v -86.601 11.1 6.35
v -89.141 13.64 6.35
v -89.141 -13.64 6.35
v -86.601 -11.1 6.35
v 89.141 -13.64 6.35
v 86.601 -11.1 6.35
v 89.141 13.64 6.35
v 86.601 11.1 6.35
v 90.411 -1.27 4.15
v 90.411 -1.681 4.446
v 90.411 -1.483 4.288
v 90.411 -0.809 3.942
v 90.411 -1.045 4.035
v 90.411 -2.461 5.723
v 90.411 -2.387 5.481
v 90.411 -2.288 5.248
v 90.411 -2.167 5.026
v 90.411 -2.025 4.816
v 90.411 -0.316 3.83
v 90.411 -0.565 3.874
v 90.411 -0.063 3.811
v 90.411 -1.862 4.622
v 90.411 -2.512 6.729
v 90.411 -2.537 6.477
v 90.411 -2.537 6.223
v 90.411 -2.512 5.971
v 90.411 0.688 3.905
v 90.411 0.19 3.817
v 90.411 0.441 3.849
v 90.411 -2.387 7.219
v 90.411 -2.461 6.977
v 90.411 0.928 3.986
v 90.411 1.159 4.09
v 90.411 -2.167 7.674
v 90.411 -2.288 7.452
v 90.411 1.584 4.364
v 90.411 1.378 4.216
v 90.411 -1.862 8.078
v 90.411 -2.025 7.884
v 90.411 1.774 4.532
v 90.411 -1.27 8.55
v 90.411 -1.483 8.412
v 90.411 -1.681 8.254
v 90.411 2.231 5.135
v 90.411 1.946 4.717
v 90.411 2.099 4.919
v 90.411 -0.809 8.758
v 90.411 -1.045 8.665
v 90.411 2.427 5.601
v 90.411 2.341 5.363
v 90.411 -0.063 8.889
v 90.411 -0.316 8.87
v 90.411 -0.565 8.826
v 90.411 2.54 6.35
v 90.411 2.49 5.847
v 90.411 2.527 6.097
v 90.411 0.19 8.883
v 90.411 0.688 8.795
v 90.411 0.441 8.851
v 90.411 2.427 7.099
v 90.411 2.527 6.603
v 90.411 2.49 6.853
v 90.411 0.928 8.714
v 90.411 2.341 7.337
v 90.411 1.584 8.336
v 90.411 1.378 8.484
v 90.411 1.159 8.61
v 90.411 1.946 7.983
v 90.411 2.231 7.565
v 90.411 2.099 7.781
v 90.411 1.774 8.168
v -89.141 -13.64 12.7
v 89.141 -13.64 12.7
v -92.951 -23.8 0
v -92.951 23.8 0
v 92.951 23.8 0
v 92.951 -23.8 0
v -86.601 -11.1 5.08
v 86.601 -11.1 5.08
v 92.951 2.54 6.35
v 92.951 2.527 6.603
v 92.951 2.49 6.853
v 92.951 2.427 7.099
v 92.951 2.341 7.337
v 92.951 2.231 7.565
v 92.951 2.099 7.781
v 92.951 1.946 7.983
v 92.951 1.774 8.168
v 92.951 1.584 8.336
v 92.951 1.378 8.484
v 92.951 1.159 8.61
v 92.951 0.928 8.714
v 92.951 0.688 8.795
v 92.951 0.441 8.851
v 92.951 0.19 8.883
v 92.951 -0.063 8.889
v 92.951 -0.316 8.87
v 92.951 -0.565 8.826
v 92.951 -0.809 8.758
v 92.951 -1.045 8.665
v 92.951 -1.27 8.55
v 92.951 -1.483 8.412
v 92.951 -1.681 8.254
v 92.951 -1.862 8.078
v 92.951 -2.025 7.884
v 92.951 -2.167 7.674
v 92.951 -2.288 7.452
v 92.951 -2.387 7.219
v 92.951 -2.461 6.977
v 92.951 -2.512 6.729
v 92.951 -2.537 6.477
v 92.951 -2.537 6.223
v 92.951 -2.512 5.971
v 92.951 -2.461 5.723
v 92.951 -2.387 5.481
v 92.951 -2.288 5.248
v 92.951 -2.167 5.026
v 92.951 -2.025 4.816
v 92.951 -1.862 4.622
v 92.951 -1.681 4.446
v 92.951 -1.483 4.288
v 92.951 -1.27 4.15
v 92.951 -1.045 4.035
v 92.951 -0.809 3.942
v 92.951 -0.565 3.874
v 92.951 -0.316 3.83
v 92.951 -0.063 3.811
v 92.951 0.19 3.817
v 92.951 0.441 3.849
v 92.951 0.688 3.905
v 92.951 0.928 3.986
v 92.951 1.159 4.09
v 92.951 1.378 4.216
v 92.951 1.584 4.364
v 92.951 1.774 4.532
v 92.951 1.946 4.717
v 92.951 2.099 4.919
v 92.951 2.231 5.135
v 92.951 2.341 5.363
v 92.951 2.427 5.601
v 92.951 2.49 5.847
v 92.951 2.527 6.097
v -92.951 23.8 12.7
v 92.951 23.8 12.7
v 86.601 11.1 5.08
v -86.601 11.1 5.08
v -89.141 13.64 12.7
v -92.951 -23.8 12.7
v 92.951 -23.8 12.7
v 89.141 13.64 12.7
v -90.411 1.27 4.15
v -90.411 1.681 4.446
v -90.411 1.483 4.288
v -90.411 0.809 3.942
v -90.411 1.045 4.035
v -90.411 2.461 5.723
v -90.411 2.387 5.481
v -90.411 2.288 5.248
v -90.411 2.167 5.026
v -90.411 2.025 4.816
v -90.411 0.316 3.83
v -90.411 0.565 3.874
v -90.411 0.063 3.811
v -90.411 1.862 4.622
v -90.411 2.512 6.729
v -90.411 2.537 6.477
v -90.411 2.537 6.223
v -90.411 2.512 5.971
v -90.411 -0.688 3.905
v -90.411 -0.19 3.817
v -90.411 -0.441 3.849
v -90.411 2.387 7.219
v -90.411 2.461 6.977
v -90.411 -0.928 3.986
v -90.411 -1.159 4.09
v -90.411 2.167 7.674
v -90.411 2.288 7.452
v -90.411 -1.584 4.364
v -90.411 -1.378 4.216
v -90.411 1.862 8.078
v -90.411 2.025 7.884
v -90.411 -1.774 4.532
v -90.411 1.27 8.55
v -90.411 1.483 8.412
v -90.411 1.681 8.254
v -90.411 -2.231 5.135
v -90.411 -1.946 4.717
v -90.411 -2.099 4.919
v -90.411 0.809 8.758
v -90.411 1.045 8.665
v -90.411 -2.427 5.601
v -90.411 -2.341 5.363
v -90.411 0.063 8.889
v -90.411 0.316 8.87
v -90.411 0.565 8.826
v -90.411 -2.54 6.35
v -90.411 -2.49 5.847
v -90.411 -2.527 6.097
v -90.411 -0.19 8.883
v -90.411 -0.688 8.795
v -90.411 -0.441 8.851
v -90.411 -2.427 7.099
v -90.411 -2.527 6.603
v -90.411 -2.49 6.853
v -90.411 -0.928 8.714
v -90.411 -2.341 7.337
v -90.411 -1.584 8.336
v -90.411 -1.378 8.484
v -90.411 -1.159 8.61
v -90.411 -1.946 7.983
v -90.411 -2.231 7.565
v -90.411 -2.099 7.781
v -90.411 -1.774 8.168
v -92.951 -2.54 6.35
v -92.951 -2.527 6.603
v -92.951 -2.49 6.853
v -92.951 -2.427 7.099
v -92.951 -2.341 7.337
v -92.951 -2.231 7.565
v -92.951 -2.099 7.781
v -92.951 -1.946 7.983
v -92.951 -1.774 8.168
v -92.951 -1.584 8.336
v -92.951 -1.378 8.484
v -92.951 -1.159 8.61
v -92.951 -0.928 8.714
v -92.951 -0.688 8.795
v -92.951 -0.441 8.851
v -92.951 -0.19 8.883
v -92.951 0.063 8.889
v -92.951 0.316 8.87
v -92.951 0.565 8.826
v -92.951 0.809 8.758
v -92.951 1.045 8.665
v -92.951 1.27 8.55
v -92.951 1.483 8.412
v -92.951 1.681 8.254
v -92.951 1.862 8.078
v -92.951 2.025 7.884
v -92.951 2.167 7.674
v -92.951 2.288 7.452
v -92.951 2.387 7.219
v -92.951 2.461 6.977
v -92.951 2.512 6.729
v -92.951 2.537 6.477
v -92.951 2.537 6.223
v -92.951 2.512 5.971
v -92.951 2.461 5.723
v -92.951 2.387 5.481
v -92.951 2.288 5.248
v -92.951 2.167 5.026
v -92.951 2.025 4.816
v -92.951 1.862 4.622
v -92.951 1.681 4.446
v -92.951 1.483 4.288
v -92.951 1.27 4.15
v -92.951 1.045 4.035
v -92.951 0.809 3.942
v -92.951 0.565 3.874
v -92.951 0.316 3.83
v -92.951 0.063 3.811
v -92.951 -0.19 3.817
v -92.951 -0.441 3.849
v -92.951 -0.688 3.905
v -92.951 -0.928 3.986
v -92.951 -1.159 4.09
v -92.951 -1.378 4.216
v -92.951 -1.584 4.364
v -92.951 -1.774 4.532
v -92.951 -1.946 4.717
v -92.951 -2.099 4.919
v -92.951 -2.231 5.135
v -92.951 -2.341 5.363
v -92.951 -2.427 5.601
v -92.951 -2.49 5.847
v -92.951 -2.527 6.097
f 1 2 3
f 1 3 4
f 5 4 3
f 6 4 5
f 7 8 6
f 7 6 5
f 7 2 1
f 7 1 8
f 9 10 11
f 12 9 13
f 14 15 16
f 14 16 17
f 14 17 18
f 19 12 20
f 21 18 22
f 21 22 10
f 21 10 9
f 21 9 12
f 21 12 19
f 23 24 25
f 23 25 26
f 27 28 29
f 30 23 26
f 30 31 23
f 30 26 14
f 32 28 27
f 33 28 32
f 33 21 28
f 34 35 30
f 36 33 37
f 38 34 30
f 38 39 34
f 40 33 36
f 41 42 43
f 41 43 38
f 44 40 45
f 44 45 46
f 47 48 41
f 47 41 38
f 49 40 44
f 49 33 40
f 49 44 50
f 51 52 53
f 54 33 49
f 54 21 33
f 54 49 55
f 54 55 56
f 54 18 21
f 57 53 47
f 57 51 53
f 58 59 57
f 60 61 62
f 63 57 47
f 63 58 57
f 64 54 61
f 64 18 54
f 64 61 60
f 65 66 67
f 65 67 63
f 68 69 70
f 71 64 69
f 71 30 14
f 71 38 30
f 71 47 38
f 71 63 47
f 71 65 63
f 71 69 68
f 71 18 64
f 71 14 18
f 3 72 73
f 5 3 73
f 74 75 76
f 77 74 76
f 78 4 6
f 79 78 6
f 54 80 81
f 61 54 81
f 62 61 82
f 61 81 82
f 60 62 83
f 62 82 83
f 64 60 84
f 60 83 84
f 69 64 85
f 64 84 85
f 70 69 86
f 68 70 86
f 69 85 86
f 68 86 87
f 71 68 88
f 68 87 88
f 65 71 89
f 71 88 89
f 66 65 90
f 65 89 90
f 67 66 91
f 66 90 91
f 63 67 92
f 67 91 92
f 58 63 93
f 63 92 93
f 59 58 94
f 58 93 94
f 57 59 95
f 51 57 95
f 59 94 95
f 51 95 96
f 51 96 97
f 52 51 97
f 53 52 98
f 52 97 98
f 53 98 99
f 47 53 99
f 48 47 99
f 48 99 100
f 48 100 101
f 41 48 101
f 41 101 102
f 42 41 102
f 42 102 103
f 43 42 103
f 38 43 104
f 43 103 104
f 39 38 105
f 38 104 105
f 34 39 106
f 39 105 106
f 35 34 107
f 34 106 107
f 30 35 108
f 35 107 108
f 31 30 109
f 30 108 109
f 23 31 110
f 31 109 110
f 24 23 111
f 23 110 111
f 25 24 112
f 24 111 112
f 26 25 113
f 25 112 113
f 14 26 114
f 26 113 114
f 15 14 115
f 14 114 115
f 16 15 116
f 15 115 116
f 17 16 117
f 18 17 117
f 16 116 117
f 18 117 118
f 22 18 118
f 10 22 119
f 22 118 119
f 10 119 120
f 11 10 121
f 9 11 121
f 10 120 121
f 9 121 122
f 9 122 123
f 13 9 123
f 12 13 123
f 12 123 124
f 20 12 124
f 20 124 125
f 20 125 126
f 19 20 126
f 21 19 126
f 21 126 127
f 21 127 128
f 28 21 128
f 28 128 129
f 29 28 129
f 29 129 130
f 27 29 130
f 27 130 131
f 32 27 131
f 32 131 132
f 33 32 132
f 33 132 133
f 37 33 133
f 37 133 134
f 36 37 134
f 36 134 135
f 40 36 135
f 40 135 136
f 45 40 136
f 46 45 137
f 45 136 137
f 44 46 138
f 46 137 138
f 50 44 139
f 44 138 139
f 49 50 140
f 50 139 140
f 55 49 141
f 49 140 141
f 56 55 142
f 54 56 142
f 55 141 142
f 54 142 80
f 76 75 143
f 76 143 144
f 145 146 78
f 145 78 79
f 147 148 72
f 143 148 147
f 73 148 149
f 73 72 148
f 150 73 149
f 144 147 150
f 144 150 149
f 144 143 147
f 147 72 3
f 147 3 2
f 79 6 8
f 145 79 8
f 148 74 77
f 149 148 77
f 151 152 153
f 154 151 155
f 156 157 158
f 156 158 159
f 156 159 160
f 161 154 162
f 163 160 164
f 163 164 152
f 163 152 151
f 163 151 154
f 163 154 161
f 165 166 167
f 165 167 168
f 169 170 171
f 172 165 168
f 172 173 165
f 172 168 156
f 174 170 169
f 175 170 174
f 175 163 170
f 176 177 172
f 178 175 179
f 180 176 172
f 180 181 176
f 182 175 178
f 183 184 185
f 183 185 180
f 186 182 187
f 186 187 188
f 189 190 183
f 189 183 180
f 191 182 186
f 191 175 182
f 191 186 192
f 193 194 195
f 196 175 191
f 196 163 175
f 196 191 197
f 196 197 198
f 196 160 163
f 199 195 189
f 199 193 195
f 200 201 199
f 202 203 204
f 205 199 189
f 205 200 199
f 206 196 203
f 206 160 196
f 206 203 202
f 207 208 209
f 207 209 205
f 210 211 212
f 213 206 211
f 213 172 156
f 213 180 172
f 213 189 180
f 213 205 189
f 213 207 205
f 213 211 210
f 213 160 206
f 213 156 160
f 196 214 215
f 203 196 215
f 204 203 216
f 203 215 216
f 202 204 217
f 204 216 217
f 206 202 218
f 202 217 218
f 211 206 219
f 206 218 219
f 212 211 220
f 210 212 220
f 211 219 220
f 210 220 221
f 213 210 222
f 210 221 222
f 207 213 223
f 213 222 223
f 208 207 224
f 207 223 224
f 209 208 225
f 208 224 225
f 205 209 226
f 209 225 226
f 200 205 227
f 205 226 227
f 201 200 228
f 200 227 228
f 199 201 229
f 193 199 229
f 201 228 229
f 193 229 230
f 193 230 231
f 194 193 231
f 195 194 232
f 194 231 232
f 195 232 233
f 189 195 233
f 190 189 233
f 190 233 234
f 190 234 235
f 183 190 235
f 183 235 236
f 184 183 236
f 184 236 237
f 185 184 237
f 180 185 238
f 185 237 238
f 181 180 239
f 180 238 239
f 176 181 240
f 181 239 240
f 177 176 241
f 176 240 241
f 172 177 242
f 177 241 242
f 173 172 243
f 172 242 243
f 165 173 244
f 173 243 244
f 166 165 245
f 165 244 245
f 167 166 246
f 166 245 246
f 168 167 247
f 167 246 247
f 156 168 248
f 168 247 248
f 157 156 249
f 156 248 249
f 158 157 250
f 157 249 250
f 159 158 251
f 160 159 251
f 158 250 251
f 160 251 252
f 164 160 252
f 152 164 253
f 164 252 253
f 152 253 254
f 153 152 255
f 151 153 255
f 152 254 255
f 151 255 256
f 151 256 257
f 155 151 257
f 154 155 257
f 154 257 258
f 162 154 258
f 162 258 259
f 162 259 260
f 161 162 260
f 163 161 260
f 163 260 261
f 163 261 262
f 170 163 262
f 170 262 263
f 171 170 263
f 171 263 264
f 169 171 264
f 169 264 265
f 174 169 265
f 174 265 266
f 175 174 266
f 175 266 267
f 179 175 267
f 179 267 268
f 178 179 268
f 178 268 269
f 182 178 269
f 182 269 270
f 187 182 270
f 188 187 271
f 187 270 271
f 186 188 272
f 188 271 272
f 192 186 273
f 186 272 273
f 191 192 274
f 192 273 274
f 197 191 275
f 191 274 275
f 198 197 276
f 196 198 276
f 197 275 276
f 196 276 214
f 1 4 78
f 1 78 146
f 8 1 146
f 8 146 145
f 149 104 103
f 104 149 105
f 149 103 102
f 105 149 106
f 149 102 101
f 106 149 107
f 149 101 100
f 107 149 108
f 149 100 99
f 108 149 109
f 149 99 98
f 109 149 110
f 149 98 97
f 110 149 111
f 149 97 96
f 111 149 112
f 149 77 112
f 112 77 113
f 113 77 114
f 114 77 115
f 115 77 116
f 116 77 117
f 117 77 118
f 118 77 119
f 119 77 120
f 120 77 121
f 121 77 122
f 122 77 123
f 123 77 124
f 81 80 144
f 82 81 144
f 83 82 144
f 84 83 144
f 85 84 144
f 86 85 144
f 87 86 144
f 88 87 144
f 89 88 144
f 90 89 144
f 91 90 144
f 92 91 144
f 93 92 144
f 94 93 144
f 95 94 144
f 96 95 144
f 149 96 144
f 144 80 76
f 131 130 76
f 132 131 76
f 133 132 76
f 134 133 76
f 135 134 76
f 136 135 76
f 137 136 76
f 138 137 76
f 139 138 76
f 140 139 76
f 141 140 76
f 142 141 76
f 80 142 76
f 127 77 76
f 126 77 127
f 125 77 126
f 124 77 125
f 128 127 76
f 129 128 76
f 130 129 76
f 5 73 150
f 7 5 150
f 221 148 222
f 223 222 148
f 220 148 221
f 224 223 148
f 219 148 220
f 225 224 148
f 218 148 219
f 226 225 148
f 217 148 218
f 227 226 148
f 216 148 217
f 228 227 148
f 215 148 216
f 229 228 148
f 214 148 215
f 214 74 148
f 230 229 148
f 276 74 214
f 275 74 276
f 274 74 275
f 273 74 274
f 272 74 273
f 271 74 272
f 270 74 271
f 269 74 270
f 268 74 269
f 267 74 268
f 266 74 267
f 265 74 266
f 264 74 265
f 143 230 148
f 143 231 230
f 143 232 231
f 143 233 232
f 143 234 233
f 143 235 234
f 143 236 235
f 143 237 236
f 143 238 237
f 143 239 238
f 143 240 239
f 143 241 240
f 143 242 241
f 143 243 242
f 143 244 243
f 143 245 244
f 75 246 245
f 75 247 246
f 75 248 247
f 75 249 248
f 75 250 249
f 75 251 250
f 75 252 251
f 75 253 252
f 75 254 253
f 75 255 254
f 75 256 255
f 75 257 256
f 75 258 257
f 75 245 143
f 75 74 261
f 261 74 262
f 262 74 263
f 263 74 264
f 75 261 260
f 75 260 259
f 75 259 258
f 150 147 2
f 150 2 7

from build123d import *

# Parameters (mm, degrees)
F0_W     = 185.9026
F0_H     = 47.5996
F1_DEPTH = 12.7
F2_R     = 2.54
F3_DEPTH = 2.54
F4_R     = 2.54
F5_DEPTH = 2.54
F6_W     = 173.2026
F6_H     = 22.1996
F7_DEPTH = 7.62
F8_W     = 178.2826
F8_H     = 27.2796
F9_DEPTH = 6.35


with BuildPart() as f1:
    # F0 (on Top) → F1 (new body)
    with BuildSketch(Plane.XY):
        Rectangle(F0_W, F0_H)
    extrude(amount=F1_DEPTH)

    # F2 (on face) → F3 (cut)
    with BuildSketch(Plane.YZ.offset(92.9513)):
        with Locations((0, 6.35)):
            Circle(F2_R)
    extrude(amount=-F3_DEPTH, mode=Mode.SUBTRACT)

    # F4 (on face) → F5 (cut)
    with BuildSketch(Plane(origin=(-92.9513, 0, 0), x_dir=(0, -1, 0), z_dir=(-1, 0, 0))):
        with Locations((0, 6.35)):
            Circle(F4_R)
    extrude(amount=-F5_DEPTH, mode=Mode.SUBTRACT)

    # F6 (on face) → F7 (cut)
    with BuildSketch(Plane.XY.offset(12.7)):
        Rectangle(F6_W, F6_H)
    extrude(amount=-F7_DEPTH, mode=Mode.SUBTRACT)

    # F8 (on face) → F9 (cut)
    with BuildSketch(Plane.XY.offset(12.7)):
        Rectangle(F8_W, F8_H)
    extrude(amount=-F9_DEPTH, mode=Mode.SUBTRACT)


solid = f1.part
